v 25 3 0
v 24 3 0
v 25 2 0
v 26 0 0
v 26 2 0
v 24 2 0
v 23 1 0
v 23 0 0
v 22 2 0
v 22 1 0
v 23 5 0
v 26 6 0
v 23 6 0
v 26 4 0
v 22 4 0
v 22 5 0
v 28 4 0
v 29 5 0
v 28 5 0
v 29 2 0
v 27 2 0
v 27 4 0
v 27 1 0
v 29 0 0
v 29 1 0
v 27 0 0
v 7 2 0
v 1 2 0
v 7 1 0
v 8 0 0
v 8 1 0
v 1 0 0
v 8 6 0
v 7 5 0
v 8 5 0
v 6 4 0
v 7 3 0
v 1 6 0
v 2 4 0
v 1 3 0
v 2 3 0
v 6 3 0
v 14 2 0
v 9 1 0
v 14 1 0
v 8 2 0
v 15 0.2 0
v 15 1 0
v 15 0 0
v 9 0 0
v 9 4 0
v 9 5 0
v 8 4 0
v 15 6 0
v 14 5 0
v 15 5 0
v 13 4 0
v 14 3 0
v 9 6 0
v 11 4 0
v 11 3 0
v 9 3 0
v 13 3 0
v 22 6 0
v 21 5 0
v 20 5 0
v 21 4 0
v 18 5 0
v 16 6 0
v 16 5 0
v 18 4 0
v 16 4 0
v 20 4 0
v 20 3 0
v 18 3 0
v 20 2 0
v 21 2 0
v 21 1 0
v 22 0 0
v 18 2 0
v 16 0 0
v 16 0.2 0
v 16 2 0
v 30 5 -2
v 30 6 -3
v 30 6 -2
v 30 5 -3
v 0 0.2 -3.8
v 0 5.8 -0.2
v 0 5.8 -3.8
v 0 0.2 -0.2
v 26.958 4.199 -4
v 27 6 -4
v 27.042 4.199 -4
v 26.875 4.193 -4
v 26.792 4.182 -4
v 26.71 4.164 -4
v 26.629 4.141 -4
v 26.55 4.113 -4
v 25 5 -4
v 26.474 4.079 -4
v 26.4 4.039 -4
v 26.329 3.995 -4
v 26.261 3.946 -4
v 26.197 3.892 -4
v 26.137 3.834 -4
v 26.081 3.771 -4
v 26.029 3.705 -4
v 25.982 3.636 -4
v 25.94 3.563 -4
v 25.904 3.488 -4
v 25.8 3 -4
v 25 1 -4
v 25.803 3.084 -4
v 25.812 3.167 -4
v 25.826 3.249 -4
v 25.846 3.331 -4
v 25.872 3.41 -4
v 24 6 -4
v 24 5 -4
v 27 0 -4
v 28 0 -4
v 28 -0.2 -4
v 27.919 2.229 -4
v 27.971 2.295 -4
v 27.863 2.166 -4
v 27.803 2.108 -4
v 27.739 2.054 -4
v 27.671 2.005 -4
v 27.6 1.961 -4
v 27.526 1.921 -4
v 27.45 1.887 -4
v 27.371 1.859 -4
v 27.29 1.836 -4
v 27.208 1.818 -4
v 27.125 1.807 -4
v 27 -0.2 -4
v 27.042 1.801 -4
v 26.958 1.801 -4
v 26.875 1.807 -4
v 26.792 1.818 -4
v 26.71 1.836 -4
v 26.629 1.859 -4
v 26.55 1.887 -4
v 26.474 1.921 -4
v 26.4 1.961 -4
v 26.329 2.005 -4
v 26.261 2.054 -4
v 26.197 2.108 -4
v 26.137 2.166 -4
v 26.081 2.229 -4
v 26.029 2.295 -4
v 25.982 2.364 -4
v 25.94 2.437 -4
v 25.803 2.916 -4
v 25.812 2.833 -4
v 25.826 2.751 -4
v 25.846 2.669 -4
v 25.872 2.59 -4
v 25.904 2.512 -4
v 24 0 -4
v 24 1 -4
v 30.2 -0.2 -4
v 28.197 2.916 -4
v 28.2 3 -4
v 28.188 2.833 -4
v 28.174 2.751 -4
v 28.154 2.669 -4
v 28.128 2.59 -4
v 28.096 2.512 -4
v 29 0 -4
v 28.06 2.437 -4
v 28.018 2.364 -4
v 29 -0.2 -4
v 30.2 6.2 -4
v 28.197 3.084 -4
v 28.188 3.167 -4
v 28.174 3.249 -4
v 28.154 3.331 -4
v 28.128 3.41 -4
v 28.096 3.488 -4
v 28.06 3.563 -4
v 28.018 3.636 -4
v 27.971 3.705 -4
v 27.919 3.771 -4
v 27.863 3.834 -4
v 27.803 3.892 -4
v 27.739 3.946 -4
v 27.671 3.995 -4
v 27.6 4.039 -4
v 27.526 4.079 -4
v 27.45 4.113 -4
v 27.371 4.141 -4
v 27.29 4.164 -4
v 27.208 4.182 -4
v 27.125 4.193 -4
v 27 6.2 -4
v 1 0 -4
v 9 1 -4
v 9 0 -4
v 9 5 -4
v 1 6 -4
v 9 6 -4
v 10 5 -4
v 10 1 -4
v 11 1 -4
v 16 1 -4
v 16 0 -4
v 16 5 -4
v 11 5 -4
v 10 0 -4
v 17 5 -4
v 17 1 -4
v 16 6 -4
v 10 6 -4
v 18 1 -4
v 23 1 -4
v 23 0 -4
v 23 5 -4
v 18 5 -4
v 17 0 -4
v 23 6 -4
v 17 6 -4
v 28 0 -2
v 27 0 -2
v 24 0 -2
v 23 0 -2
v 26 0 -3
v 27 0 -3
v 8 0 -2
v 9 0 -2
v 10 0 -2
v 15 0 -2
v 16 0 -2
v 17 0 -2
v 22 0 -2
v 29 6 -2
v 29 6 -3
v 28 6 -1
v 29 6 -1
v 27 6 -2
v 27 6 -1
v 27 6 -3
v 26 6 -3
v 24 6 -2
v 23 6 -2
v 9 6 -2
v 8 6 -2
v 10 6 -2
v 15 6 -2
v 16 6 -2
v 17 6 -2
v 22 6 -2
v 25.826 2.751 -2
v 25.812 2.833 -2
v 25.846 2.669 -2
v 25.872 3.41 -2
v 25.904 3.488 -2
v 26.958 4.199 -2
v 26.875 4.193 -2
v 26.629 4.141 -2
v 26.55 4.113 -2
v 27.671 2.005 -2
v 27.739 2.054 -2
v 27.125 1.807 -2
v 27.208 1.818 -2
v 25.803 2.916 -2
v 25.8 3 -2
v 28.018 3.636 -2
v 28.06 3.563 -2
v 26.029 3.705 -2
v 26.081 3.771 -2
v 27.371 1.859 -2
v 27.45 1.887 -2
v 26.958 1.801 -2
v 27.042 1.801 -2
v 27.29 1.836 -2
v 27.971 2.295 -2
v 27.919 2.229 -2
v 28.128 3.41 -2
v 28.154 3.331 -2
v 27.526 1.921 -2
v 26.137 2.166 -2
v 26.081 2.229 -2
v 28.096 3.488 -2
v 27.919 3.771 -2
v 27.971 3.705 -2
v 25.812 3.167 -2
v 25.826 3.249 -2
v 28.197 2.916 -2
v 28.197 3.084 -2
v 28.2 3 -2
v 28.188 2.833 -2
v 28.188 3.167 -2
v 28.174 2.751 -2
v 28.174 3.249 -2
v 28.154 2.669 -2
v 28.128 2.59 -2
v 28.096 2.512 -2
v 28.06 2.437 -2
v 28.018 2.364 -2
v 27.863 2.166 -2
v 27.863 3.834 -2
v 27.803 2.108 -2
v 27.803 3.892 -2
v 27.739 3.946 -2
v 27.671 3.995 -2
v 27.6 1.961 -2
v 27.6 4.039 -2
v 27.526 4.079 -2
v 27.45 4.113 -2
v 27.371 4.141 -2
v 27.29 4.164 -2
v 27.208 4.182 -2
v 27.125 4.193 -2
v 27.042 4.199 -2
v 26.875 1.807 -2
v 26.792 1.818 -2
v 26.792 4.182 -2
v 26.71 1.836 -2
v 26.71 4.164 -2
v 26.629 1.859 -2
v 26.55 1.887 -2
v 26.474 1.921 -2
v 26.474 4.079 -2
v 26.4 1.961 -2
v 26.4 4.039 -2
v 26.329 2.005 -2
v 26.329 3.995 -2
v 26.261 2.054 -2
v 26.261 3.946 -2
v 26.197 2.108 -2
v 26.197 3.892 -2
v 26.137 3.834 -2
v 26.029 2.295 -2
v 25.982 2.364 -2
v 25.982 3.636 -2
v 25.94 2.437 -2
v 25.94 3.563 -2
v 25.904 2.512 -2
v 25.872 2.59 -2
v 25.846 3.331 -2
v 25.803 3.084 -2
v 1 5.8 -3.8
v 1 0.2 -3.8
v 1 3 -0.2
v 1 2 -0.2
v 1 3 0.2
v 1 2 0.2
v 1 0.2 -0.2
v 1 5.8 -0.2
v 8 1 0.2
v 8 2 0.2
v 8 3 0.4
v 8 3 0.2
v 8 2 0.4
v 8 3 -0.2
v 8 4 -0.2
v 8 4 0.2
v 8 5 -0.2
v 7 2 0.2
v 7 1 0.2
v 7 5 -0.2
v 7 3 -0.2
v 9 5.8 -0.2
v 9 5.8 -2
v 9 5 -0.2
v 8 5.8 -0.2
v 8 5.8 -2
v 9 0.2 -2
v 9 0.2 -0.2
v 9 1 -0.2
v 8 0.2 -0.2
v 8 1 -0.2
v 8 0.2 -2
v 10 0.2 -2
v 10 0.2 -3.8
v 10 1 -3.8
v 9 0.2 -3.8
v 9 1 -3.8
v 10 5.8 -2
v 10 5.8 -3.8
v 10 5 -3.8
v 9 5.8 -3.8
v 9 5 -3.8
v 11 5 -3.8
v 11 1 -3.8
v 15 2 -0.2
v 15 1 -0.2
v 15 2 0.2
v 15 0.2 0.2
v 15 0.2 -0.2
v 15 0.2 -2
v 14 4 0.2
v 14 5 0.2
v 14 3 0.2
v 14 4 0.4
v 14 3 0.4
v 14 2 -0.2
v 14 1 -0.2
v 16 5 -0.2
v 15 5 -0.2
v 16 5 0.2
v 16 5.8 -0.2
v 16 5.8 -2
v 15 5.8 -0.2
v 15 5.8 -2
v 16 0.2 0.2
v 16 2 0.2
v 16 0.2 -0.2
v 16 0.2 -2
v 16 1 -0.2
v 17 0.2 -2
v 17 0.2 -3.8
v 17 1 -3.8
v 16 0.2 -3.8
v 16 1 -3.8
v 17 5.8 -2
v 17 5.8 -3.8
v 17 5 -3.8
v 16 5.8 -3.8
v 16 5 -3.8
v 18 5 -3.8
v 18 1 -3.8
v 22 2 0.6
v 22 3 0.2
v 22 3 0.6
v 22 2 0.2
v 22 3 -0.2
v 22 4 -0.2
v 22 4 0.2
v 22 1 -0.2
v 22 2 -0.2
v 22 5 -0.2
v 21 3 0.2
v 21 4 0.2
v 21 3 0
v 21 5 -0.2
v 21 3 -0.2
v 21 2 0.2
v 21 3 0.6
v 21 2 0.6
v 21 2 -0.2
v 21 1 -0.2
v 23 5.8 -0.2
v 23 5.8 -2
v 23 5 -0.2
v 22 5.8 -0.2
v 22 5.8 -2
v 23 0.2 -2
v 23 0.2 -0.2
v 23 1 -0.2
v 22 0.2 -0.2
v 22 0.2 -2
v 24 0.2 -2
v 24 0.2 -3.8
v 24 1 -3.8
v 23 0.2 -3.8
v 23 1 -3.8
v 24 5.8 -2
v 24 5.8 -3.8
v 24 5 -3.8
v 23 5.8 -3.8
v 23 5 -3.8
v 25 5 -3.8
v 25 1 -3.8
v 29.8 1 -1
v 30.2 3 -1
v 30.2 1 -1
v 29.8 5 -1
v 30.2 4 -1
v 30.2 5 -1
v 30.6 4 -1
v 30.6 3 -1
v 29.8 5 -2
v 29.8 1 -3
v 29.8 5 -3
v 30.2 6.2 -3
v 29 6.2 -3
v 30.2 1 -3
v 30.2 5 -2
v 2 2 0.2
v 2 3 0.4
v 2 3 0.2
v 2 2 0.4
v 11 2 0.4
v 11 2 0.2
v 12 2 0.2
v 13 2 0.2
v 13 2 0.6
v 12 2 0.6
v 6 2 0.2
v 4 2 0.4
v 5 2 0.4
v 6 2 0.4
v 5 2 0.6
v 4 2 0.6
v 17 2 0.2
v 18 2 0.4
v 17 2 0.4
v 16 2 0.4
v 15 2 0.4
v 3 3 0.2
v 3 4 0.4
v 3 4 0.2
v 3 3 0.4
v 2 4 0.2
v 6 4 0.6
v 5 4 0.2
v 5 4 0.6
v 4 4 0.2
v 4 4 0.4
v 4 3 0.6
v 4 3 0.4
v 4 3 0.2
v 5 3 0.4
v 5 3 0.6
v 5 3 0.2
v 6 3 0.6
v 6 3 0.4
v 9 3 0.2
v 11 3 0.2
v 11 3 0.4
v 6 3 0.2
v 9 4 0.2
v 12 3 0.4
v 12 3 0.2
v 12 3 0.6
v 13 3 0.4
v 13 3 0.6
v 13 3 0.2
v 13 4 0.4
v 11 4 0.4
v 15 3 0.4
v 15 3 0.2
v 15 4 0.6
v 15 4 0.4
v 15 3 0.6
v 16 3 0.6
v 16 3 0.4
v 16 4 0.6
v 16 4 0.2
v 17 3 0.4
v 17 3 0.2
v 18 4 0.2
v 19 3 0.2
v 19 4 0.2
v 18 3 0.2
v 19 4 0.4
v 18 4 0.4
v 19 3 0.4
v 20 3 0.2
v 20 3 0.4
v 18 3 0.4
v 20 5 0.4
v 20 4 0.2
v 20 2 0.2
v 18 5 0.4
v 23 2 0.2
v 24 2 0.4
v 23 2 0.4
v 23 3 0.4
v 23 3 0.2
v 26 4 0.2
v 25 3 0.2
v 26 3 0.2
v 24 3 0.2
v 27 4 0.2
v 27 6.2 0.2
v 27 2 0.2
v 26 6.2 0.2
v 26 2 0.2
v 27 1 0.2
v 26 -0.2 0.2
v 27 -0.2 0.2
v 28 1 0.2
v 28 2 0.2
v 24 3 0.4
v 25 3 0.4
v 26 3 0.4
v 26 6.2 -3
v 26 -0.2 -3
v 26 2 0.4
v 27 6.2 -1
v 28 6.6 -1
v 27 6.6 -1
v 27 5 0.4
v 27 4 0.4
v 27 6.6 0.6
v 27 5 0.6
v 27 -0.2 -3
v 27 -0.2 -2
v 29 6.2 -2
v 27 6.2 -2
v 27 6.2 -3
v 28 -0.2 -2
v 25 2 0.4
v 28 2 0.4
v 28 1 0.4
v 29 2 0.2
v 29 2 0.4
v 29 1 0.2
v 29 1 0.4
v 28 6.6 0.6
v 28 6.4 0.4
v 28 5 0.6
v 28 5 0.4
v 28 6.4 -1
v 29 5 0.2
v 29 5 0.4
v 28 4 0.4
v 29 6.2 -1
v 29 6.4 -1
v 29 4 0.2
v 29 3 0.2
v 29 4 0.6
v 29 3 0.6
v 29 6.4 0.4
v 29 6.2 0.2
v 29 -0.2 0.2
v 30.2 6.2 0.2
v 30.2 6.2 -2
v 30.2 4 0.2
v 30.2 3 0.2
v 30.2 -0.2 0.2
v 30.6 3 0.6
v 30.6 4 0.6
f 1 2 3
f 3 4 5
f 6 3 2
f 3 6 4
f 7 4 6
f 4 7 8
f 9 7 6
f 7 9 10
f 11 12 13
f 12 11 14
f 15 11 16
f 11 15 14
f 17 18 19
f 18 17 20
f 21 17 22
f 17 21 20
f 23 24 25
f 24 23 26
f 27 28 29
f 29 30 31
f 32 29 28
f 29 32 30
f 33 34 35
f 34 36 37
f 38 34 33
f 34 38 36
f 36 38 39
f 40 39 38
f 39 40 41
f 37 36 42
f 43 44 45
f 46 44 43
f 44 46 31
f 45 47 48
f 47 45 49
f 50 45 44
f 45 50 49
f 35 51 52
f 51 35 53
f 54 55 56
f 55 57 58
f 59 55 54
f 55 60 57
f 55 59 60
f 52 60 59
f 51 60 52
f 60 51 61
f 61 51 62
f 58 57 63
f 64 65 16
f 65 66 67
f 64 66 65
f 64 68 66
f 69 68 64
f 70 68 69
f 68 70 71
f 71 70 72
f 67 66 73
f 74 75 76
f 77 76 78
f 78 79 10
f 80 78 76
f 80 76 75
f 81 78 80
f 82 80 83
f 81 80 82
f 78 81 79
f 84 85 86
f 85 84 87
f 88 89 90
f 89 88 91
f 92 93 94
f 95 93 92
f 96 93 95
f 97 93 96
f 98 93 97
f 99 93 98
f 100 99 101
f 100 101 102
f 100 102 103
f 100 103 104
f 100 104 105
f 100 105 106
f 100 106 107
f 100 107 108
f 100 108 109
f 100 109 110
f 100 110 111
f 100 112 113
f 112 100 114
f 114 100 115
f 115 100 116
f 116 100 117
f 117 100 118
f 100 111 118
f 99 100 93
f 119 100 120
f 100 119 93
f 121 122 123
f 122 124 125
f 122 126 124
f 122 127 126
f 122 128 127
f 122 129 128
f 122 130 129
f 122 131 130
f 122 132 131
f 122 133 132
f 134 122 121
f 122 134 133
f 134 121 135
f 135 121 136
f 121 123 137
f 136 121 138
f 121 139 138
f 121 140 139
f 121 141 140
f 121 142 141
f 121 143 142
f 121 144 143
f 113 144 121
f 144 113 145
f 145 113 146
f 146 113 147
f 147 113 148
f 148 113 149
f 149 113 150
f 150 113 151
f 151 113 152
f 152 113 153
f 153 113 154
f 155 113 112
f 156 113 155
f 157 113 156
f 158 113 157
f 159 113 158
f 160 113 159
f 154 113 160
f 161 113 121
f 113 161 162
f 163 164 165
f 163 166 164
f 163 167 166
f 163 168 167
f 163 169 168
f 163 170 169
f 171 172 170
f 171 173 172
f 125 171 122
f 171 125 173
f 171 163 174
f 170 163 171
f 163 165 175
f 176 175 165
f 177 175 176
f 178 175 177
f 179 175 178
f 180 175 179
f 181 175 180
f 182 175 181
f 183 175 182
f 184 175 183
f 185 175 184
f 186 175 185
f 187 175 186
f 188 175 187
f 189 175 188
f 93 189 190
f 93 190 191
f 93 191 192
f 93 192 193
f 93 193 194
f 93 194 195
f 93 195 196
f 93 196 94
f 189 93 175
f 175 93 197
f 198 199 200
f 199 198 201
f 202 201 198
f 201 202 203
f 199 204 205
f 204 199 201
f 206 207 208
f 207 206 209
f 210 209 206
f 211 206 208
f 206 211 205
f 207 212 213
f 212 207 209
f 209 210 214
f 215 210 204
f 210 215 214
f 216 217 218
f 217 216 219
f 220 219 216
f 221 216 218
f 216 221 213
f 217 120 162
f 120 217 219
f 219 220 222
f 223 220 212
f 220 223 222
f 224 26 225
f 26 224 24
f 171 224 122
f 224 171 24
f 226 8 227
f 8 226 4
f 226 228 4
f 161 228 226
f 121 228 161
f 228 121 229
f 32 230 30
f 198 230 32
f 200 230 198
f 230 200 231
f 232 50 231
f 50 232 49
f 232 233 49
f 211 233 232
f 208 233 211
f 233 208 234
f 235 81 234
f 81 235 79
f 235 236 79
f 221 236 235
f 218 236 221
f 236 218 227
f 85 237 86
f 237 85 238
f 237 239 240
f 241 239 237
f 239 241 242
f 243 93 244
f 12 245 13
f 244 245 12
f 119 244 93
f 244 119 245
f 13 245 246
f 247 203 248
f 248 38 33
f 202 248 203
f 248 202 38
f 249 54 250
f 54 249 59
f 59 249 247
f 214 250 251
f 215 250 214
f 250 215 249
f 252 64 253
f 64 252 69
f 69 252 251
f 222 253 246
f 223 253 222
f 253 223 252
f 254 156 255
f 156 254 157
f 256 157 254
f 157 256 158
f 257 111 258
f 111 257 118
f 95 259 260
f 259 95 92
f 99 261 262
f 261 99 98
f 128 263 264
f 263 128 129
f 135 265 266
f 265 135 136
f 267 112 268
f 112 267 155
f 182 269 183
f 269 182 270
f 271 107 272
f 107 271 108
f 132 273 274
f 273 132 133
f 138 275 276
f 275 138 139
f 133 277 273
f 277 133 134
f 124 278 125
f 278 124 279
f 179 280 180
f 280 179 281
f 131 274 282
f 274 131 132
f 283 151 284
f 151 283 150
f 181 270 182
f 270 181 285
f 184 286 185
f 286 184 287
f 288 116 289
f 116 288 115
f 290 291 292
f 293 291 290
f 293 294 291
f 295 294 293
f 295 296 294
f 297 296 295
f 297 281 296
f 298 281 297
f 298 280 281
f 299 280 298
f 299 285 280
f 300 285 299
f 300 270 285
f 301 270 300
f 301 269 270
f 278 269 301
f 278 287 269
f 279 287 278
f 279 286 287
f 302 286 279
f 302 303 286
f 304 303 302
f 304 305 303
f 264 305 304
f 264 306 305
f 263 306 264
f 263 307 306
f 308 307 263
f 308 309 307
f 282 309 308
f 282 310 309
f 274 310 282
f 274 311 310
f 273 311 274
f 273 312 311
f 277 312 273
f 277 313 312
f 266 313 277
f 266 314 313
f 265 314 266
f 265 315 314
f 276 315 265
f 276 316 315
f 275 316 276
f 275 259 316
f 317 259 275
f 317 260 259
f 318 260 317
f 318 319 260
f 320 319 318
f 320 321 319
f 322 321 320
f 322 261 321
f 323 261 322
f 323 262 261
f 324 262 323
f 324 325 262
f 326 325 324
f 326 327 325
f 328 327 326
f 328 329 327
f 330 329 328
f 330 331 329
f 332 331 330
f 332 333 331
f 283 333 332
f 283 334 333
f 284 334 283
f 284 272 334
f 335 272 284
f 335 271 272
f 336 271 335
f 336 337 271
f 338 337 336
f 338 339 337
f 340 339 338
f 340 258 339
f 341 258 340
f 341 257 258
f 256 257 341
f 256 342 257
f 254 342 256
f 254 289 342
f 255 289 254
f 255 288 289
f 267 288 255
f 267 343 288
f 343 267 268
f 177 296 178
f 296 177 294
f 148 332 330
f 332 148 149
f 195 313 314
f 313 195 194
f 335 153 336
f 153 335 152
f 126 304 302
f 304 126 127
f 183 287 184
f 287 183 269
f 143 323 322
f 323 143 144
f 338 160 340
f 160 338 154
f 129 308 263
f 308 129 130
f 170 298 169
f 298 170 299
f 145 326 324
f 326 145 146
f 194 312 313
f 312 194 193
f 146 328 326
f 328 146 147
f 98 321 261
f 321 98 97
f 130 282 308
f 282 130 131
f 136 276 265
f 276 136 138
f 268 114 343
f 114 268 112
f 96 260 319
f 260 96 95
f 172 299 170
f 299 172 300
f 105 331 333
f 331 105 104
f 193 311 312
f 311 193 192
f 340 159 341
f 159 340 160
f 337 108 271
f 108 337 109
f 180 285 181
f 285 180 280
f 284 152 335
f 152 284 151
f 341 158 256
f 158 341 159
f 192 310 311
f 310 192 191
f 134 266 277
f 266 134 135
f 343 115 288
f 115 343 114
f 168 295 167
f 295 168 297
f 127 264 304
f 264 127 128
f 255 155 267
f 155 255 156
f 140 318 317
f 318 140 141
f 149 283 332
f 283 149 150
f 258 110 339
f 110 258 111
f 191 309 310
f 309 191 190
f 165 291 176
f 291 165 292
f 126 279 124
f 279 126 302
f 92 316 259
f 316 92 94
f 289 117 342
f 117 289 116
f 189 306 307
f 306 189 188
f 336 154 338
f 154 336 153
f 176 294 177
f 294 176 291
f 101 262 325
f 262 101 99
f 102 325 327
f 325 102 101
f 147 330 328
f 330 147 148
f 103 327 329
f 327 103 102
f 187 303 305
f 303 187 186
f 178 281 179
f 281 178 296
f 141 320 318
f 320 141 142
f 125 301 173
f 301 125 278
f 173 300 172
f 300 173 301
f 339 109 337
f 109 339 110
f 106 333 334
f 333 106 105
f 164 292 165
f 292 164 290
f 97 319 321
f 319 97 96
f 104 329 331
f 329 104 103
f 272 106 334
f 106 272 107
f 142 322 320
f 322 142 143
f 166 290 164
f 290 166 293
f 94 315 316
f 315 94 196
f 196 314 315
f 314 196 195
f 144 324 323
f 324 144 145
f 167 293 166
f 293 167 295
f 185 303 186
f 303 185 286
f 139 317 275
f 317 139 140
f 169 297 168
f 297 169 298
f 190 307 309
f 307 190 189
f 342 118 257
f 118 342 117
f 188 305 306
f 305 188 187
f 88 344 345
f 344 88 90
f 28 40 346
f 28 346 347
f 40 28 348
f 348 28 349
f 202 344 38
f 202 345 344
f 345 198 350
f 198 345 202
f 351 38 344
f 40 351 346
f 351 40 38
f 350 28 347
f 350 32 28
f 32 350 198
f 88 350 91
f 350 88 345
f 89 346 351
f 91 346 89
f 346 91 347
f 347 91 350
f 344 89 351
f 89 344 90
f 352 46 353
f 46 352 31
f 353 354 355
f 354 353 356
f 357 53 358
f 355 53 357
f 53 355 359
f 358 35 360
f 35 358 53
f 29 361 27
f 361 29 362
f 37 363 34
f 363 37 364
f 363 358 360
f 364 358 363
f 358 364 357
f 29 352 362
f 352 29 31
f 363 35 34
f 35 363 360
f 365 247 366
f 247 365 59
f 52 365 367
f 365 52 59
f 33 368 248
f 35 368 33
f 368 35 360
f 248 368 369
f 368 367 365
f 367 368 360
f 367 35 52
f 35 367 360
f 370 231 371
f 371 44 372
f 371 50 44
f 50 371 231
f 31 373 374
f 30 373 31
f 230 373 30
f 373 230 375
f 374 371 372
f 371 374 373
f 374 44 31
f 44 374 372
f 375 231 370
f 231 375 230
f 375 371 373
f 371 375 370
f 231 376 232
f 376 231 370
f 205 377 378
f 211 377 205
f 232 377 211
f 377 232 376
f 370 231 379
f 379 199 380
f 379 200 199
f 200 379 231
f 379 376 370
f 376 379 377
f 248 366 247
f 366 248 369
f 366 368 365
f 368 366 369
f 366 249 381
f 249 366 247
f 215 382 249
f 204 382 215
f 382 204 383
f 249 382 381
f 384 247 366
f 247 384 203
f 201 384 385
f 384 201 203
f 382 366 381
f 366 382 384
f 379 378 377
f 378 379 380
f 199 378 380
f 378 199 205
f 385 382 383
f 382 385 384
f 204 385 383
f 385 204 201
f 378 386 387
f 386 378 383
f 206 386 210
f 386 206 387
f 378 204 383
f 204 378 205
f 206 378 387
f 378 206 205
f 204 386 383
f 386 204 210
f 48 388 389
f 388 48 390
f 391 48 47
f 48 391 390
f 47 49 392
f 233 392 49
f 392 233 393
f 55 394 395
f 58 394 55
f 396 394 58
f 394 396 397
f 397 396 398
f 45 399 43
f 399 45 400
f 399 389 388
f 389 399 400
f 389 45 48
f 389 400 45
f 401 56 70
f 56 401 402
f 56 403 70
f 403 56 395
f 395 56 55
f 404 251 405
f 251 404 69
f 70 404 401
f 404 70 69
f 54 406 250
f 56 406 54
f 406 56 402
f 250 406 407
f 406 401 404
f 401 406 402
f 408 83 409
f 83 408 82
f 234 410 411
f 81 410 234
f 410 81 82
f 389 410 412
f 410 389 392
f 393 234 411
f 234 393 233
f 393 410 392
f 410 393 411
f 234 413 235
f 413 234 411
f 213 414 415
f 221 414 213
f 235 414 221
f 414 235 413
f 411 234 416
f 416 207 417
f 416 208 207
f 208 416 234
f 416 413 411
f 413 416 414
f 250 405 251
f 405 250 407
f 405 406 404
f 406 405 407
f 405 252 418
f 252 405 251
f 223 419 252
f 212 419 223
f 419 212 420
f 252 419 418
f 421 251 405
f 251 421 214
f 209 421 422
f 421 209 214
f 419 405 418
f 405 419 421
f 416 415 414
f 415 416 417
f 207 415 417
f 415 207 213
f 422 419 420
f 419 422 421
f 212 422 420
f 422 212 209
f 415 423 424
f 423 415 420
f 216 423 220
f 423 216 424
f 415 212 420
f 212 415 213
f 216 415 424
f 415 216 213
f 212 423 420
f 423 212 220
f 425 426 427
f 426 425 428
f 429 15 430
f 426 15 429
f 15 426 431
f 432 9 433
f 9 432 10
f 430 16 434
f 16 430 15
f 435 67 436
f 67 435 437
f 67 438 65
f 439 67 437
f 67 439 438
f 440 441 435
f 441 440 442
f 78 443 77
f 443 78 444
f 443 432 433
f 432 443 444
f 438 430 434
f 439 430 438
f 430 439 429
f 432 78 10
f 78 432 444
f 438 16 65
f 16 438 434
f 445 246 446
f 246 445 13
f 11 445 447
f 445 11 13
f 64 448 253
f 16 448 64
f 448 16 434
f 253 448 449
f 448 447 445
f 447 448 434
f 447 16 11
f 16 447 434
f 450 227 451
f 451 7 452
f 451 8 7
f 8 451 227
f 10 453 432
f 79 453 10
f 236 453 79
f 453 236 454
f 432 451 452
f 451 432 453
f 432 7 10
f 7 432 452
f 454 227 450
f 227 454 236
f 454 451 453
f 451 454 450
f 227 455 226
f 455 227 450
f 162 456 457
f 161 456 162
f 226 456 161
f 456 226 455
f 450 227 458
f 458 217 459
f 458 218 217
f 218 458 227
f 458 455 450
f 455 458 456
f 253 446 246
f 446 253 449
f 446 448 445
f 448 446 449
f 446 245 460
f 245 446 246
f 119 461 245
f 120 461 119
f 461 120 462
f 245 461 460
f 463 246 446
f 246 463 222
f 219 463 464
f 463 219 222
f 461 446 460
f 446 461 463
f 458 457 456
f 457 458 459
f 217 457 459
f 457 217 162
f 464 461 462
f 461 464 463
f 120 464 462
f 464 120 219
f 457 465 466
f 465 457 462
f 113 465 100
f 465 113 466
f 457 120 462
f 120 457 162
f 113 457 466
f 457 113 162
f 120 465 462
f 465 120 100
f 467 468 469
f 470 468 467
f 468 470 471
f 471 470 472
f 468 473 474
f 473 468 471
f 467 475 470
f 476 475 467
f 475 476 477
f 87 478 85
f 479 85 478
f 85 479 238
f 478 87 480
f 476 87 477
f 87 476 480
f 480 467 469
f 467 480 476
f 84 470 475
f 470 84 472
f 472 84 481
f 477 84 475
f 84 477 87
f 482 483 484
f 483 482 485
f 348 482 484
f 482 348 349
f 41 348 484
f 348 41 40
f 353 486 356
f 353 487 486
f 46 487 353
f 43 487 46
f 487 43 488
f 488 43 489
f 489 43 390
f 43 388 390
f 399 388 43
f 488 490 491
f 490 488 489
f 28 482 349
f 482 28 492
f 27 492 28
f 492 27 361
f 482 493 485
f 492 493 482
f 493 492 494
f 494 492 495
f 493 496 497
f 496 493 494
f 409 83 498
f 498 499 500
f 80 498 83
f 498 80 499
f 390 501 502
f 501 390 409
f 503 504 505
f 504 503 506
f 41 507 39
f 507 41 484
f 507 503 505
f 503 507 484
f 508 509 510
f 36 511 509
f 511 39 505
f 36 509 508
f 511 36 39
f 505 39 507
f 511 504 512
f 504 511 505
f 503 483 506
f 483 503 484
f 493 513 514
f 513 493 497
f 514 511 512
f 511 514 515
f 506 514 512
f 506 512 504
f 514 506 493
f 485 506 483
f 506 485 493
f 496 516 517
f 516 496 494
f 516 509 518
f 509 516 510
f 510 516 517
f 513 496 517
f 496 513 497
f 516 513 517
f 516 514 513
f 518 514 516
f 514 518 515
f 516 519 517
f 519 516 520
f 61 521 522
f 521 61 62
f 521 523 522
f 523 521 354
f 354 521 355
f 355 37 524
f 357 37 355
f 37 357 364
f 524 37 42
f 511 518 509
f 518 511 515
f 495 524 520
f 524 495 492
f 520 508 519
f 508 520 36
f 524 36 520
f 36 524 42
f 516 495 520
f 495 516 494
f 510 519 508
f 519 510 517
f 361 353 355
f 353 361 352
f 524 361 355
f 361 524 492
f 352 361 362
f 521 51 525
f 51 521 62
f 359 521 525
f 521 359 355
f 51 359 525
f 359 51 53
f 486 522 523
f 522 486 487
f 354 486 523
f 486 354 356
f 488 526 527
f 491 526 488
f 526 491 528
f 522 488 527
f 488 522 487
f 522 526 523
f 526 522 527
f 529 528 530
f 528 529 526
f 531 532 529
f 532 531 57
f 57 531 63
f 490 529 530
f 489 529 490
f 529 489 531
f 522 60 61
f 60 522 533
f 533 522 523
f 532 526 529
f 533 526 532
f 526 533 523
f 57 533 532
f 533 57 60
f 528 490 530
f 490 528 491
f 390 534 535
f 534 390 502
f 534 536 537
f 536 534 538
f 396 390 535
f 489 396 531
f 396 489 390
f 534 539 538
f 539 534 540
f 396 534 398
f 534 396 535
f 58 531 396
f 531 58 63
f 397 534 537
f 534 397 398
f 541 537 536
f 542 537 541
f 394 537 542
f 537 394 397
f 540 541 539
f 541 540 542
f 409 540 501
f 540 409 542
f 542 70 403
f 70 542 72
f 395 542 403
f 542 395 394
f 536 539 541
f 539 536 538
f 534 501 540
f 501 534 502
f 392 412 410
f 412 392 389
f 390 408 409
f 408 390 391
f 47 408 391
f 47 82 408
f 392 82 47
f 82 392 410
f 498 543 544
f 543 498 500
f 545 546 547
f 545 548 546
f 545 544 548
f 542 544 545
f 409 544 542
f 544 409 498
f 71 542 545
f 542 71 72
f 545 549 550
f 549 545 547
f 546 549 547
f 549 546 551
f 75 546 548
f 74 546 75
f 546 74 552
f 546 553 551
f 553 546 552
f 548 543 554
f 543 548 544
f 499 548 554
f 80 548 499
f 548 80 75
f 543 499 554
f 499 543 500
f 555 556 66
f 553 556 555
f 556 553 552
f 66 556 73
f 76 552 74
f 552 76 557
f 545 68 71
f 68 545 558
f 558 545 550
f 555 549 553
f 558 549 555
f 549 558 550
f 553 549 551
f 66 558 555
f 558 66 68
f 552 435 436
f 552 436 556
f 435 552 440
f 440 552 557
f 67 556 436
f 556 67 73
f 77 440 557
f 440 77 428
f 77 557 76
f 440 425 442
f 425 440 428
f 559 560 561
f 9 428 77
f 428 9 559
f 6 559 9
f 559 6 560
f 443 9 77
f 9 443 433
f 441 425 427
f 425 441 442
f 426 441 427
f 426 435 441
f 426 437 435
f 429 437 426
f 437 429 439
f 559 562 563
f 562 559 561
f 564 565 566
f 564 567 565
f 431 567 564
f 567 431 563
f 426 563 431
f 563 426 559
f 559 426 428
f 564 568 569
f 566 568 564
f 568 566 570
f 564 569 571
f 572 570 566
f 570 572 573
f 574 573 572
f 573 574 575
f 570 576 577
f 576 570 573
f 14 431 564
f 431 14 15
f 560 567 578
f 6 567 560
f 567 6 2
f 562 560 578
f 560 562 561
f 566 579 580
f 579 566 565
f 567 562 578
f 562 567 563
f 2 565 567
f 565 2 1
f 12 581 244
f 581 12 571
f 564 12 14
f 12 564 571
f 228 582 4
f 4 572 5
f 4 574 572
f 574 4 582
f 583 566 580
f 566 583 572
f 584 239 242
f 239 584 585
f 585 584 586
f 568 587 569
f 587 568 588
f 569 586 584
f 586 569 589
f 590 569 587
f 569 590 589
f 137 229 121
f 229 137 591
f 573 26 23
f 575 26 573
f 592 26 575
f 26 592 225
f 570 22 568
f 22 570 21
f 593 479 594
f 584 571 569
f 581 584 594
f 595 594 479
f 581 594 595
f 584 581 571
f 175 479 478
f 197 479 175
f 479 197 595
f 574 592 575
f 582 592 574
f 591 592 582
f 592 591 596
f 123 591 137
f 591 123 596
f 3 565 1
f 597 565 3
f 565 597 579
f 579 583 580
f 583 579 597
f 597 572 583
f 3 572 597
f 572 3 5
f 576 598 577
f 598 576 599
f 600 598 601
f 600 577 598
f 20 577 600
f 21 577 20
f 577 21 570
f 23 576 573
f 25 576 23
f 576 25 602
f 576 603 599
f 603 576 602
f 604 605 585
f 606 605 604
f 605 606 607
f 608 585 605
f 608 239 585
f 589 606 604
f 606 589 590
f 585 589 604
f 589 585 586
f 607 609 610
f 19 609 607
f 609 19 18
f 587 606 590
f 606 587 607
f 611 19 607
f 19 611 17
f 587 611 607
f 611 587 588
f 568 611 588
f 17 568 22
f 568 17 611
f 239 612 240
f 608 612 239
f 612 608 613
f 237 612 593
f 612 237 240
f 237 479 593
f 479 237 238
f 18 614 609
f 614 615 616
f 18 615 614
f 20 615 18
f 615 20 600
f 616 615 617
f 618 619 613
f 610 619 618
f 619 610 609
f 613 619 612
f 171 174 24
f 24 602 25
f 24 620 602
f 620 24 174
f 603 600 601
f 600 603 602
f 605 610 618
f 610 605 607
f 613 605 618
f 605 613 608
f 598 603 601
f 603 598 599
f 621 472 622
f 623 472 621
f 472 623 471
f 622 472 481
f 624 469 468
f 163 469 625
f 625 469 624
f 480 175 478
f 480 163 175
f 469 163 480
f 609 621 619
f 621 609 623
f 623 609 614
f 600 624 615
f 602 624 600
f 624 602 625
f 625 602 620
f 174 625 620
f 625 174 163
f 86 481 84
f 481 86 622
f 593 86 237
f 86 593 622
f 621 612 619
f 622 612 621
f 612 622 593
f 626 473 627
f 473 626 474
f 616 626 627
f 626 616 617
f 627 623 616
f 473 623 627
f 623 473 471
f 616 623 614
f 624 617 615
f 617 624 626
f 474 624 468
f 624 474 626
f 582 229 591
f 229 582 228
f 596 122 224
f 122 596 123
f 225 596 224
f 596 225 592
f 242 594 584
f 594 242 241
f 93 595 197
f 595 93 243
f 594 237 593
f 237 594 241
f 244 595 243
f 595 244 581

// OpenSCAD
//right arm

$fn=90;

rotate([0,90,0]){

translate([4,6,0]){
rotate([0,0,180]){
difference(){

color("darkgrey"){
cube([4,6,30]);
}

translate([-1,3,27]){
rotate([0,90,0]){
cylinder(r=1.2,h=3);
}
}

//rivet 1

translate([-0.8,0,0]){
color("tan"){
cube([1,6,1]);
}
}

translate([0,5.8,0]){
color("tan"){
cube([4,1,1]);
}
}

translate([3.8,0,0]){
color("tan"){
cube([1,6,1]);
}
}

translate([0,-0.8,0]){
color("tan"){
cube([4,1,1]);
}
}

//rivet 2

translate([3.8,1,7]){
color("tan"){
cube([1,4,1]);
}
}

translate([3.8,0,8]){
color("tan"){
cube([1,1,1]);
}
}

translate([3.8,5,8]){
color("tan"){
cube([1,1,1]);
}
}

translate([2,5.8,8]){
color("tan"){
cube([2,1,1]);
}
}

translate([0,5.8,9]){
color("tan"){
cube([2,1,1]);
}
}

translate([2,-0.8,8]){
color("tan"){
cube([2,1,1]);
}
}

translate([0,-0.8,9]){
color("tan"){
cube([2,1,1]);
}
}

translate([-0.8,5,9]){
color("tan"){
cube([1,1,1]);
}
}

translate([-0.8,0,9]){
color("tan"){
cube([1,1,1]);
}
}

translate([-0.8,1,10]){
color("tan"){
cube([1,4,1]);
}
}

//rivet 3

translate([3.8,1,14]){
color("tan"){
cube([1,4,1]);
}
}

translate([3.8,0,15]){
color("tan"){
cube([1,1,1]);
}
}

translate([3.8,5,15]){
color("tan"){
cube([1,1,1]);
}
}

translate([2,5.8,15]){
color("tan"){
cube([2,1,1]);
}
}

translate([0,5.8,16]){
color("tan"){
cube([2,1,1]);
}
}

translate([2,-0.8,15]){
color("tan"){
cube([2,1,1]);
}
}

translate([0,-0.8,16]){
color("tan"){
cube([2,1,1]);
}
}

translate([-0.8,5,16]){
color("tan"){
cube([1,1,1]);
}
}

translate([-0.8,0,16]){
color("tan"){
cube([1,1,1]);
}
}

translate([-0.8,1,17]){
color("tan"){
cube([1,4,1]);
}
}

//rivet 4

translate([3.8,1,21]){
color("tan"){
cube([1,4,1]);
}
}

translate([3.8,0,22]){
color("tan"){
cube([1,1,1]);
}
}

translate([3.8,5,22]){
color("tan"){
cube([1,1,1]);
}
}

translate([2,5.8,22]){
color("tan"){
cube([2,1,1]);
}
}

translate([0,5.8,23]){
color("tan"){
cube([2,1,1]);
}
}

translate([2,-0.8,22]){
color("tan"){
cube([2,1,1]);
}
}

translate([0,-0.8,23]){
color("tan"){
cube([2,1,1]);
}
}

translate([-0.8,5,23]){
color("tan"){
cube([1,1,1]);
}
}

translate([-0.8,0,23]){
color("tan"){
cube([1,1,1]);
}
}

translate([-0.8,1,24]){
color("tan"){
cube([1,4,1]);
}
}

//top

translate([1,1,29.8]){
color("grey"){
cube([2,4,1]);
}
}

}//end of diff
}//rotate
}//traslate

//vines

translate([-0.2,2,1]){
color("darkgreen"){
cube([1,1,1]);   
}
}

translate([-0.2,3,2]){
color("darkgreen"){
cube([1,1,1]);   
}
}

translate([-0.4,2,2]){
color("green"){
cube([1,1,2]);   
}
}

translate([-0.4,3,3]){
color("green"){
cube([1,1,1]);   
}
}

translate([-0.6,2,4]){
color("yellow"){
cube([1,1,1]);   
}
}

translate([-0.2,3,4]){
color("darkgreen"){
cube([1,1,1]);   
}
}

translate([-0.4,2,5]){
color("green"){
cube([1,1,1]);   
}
}

translate([-0.6,3,5]){
color("yellow"){
cube([1,1,1]);   
}
}

translate([-0.2,2,6]){
color("darkgreen"){
cube([1,1,2]);   
}
}

translate([-0.2,1,7]){
color("darkgreen"){
cube([1,1,1]);   
}
}

translate([-0.2,3,8]){
color("darkgreen"){
cube([1,1,1]);   
}
}

translate([-0.2,3,8]){
color("darkgreen"){
cube([1,1,1]);   
}
}

translate([-0.4,2,8]){
color("green"){
cube([1,1,3]);   
}
}

translate([-0.2,2,11]){
color("darkgreen"){
cube([1,1,1]);   
}
}

translate([-0.4,3,11]){
color("green"){
cube([1,1,2]);   
}
}

translate([-0.6,2,12]){
color("yellow"){
cube([1,1,1]);   
}
}

translate([-0.2,2,13]){
color("darkgreen"){
cube([1,1,2]);   
}
}

translate([-0.4,3,14]){
color("green"){
cube([1,1,1]);   
}
}

translate([-0.2,4,14]){
color("darkgreen"){
cube([1,1,2]);   
}
}

translate([-0.6,3,15]){
color("yellow"){
cube([1,1,1]);   
}
}

translate([-0.4,2,15]){
color("green"){
cube([1,1,1]);   
}
}

translate([-0.2,0.2,15]){
color("darkgreen"){
cube([0.4,1.8,1]);   
}
}

translate([-0.2,2,16]){
color("darkgreen"){
cube([1,2,1]);   
}
}

translate([-0.2,3,17]){
color("darkgreen"){
cube([1,1,2]);   
}
}

translate([-0.4,2,17]){
color("green"){
cube([1,1,1]);   
}
}

translate([-0.4,4,18]){
color("green"){
cube([1,1,2]);   
}
}

translate([-0.4,3,19]){
color("green"){
cube([1,1,1]);   
}
}

translate([-0.2,2,20]){
color("darkgreen"){
cube([0.2,2,1]);   
}
}

translate([-0.6,2,21]){
color("yellow"){
cube([1,1,1]);   
}
}

translate([-0.2,2,22]){
color("darkgreen"){
cube([1,2,1]);   
}
}

translate([-0.4,2,23]){
color("green"){
cube([1,1,1]);   
}
}

translate([-0.2,3,23]){
color("darkgreen"){
cube([1,1,3]);   
}
}

translate([-0.2,-0.2,26]){
color("darkgreen"){
cube([1.2,6.4,1]);   
}
}

translate([-0.4,2,25]){
color("green"){
cube([1,1,1]);   
}
}

translate([-0.2,1,27]){
color("darkgreen"){
cube([1,1,1]);   
}
}

translate([-0.6,5,27]){
color("yellow"){
cube([1.6,1.6,1]);   
}
}

translate([-0.4,4,27]){
color("green"){
cube([1,1,1]);   
}
}

translate([-0.4,5,28]){
color("green"){
cube([1.4,1.4,1]);   
}
}

translate([-0.4,1,28]){
color("green"){
cube([1,1,1]);   
}
}

translate([-0.2,-0.2,29]){
color("darkgreen"){
cube([1.2,5.2,1.2]);   
}
}

translate([-0.2,5,29]){
color("darkgreen"){
cube([2.2,1.2,1.2]);   
}
}

translate([-0.6,3,29]){
color("yellow"){
cube([1.6,1,1.6]);   
}
}

translate([3,-0.2,29]){
color("darkgreen"){
cube([1,6.4,1.2]);   
}
}

translate([1,-0.2,29]){
color("darkgreen"){
cube([2,1.2,1.2]);   
}
}

translate([1,-0.2,26]){
color("darkgreen"){
cube([2,1.2,1]);   
}
}

translate([2,-0.2,27]){
color("darkgreen"){
cube([2,0.2,1]);   
}
}

translate([2,6,27]){
color("darkgreen"){
cube([2,0.2,2]);   
}
}

translate([1,5.2,26]){
color("darkgreen"){
cube([2,1,1]);   
}
}

}
